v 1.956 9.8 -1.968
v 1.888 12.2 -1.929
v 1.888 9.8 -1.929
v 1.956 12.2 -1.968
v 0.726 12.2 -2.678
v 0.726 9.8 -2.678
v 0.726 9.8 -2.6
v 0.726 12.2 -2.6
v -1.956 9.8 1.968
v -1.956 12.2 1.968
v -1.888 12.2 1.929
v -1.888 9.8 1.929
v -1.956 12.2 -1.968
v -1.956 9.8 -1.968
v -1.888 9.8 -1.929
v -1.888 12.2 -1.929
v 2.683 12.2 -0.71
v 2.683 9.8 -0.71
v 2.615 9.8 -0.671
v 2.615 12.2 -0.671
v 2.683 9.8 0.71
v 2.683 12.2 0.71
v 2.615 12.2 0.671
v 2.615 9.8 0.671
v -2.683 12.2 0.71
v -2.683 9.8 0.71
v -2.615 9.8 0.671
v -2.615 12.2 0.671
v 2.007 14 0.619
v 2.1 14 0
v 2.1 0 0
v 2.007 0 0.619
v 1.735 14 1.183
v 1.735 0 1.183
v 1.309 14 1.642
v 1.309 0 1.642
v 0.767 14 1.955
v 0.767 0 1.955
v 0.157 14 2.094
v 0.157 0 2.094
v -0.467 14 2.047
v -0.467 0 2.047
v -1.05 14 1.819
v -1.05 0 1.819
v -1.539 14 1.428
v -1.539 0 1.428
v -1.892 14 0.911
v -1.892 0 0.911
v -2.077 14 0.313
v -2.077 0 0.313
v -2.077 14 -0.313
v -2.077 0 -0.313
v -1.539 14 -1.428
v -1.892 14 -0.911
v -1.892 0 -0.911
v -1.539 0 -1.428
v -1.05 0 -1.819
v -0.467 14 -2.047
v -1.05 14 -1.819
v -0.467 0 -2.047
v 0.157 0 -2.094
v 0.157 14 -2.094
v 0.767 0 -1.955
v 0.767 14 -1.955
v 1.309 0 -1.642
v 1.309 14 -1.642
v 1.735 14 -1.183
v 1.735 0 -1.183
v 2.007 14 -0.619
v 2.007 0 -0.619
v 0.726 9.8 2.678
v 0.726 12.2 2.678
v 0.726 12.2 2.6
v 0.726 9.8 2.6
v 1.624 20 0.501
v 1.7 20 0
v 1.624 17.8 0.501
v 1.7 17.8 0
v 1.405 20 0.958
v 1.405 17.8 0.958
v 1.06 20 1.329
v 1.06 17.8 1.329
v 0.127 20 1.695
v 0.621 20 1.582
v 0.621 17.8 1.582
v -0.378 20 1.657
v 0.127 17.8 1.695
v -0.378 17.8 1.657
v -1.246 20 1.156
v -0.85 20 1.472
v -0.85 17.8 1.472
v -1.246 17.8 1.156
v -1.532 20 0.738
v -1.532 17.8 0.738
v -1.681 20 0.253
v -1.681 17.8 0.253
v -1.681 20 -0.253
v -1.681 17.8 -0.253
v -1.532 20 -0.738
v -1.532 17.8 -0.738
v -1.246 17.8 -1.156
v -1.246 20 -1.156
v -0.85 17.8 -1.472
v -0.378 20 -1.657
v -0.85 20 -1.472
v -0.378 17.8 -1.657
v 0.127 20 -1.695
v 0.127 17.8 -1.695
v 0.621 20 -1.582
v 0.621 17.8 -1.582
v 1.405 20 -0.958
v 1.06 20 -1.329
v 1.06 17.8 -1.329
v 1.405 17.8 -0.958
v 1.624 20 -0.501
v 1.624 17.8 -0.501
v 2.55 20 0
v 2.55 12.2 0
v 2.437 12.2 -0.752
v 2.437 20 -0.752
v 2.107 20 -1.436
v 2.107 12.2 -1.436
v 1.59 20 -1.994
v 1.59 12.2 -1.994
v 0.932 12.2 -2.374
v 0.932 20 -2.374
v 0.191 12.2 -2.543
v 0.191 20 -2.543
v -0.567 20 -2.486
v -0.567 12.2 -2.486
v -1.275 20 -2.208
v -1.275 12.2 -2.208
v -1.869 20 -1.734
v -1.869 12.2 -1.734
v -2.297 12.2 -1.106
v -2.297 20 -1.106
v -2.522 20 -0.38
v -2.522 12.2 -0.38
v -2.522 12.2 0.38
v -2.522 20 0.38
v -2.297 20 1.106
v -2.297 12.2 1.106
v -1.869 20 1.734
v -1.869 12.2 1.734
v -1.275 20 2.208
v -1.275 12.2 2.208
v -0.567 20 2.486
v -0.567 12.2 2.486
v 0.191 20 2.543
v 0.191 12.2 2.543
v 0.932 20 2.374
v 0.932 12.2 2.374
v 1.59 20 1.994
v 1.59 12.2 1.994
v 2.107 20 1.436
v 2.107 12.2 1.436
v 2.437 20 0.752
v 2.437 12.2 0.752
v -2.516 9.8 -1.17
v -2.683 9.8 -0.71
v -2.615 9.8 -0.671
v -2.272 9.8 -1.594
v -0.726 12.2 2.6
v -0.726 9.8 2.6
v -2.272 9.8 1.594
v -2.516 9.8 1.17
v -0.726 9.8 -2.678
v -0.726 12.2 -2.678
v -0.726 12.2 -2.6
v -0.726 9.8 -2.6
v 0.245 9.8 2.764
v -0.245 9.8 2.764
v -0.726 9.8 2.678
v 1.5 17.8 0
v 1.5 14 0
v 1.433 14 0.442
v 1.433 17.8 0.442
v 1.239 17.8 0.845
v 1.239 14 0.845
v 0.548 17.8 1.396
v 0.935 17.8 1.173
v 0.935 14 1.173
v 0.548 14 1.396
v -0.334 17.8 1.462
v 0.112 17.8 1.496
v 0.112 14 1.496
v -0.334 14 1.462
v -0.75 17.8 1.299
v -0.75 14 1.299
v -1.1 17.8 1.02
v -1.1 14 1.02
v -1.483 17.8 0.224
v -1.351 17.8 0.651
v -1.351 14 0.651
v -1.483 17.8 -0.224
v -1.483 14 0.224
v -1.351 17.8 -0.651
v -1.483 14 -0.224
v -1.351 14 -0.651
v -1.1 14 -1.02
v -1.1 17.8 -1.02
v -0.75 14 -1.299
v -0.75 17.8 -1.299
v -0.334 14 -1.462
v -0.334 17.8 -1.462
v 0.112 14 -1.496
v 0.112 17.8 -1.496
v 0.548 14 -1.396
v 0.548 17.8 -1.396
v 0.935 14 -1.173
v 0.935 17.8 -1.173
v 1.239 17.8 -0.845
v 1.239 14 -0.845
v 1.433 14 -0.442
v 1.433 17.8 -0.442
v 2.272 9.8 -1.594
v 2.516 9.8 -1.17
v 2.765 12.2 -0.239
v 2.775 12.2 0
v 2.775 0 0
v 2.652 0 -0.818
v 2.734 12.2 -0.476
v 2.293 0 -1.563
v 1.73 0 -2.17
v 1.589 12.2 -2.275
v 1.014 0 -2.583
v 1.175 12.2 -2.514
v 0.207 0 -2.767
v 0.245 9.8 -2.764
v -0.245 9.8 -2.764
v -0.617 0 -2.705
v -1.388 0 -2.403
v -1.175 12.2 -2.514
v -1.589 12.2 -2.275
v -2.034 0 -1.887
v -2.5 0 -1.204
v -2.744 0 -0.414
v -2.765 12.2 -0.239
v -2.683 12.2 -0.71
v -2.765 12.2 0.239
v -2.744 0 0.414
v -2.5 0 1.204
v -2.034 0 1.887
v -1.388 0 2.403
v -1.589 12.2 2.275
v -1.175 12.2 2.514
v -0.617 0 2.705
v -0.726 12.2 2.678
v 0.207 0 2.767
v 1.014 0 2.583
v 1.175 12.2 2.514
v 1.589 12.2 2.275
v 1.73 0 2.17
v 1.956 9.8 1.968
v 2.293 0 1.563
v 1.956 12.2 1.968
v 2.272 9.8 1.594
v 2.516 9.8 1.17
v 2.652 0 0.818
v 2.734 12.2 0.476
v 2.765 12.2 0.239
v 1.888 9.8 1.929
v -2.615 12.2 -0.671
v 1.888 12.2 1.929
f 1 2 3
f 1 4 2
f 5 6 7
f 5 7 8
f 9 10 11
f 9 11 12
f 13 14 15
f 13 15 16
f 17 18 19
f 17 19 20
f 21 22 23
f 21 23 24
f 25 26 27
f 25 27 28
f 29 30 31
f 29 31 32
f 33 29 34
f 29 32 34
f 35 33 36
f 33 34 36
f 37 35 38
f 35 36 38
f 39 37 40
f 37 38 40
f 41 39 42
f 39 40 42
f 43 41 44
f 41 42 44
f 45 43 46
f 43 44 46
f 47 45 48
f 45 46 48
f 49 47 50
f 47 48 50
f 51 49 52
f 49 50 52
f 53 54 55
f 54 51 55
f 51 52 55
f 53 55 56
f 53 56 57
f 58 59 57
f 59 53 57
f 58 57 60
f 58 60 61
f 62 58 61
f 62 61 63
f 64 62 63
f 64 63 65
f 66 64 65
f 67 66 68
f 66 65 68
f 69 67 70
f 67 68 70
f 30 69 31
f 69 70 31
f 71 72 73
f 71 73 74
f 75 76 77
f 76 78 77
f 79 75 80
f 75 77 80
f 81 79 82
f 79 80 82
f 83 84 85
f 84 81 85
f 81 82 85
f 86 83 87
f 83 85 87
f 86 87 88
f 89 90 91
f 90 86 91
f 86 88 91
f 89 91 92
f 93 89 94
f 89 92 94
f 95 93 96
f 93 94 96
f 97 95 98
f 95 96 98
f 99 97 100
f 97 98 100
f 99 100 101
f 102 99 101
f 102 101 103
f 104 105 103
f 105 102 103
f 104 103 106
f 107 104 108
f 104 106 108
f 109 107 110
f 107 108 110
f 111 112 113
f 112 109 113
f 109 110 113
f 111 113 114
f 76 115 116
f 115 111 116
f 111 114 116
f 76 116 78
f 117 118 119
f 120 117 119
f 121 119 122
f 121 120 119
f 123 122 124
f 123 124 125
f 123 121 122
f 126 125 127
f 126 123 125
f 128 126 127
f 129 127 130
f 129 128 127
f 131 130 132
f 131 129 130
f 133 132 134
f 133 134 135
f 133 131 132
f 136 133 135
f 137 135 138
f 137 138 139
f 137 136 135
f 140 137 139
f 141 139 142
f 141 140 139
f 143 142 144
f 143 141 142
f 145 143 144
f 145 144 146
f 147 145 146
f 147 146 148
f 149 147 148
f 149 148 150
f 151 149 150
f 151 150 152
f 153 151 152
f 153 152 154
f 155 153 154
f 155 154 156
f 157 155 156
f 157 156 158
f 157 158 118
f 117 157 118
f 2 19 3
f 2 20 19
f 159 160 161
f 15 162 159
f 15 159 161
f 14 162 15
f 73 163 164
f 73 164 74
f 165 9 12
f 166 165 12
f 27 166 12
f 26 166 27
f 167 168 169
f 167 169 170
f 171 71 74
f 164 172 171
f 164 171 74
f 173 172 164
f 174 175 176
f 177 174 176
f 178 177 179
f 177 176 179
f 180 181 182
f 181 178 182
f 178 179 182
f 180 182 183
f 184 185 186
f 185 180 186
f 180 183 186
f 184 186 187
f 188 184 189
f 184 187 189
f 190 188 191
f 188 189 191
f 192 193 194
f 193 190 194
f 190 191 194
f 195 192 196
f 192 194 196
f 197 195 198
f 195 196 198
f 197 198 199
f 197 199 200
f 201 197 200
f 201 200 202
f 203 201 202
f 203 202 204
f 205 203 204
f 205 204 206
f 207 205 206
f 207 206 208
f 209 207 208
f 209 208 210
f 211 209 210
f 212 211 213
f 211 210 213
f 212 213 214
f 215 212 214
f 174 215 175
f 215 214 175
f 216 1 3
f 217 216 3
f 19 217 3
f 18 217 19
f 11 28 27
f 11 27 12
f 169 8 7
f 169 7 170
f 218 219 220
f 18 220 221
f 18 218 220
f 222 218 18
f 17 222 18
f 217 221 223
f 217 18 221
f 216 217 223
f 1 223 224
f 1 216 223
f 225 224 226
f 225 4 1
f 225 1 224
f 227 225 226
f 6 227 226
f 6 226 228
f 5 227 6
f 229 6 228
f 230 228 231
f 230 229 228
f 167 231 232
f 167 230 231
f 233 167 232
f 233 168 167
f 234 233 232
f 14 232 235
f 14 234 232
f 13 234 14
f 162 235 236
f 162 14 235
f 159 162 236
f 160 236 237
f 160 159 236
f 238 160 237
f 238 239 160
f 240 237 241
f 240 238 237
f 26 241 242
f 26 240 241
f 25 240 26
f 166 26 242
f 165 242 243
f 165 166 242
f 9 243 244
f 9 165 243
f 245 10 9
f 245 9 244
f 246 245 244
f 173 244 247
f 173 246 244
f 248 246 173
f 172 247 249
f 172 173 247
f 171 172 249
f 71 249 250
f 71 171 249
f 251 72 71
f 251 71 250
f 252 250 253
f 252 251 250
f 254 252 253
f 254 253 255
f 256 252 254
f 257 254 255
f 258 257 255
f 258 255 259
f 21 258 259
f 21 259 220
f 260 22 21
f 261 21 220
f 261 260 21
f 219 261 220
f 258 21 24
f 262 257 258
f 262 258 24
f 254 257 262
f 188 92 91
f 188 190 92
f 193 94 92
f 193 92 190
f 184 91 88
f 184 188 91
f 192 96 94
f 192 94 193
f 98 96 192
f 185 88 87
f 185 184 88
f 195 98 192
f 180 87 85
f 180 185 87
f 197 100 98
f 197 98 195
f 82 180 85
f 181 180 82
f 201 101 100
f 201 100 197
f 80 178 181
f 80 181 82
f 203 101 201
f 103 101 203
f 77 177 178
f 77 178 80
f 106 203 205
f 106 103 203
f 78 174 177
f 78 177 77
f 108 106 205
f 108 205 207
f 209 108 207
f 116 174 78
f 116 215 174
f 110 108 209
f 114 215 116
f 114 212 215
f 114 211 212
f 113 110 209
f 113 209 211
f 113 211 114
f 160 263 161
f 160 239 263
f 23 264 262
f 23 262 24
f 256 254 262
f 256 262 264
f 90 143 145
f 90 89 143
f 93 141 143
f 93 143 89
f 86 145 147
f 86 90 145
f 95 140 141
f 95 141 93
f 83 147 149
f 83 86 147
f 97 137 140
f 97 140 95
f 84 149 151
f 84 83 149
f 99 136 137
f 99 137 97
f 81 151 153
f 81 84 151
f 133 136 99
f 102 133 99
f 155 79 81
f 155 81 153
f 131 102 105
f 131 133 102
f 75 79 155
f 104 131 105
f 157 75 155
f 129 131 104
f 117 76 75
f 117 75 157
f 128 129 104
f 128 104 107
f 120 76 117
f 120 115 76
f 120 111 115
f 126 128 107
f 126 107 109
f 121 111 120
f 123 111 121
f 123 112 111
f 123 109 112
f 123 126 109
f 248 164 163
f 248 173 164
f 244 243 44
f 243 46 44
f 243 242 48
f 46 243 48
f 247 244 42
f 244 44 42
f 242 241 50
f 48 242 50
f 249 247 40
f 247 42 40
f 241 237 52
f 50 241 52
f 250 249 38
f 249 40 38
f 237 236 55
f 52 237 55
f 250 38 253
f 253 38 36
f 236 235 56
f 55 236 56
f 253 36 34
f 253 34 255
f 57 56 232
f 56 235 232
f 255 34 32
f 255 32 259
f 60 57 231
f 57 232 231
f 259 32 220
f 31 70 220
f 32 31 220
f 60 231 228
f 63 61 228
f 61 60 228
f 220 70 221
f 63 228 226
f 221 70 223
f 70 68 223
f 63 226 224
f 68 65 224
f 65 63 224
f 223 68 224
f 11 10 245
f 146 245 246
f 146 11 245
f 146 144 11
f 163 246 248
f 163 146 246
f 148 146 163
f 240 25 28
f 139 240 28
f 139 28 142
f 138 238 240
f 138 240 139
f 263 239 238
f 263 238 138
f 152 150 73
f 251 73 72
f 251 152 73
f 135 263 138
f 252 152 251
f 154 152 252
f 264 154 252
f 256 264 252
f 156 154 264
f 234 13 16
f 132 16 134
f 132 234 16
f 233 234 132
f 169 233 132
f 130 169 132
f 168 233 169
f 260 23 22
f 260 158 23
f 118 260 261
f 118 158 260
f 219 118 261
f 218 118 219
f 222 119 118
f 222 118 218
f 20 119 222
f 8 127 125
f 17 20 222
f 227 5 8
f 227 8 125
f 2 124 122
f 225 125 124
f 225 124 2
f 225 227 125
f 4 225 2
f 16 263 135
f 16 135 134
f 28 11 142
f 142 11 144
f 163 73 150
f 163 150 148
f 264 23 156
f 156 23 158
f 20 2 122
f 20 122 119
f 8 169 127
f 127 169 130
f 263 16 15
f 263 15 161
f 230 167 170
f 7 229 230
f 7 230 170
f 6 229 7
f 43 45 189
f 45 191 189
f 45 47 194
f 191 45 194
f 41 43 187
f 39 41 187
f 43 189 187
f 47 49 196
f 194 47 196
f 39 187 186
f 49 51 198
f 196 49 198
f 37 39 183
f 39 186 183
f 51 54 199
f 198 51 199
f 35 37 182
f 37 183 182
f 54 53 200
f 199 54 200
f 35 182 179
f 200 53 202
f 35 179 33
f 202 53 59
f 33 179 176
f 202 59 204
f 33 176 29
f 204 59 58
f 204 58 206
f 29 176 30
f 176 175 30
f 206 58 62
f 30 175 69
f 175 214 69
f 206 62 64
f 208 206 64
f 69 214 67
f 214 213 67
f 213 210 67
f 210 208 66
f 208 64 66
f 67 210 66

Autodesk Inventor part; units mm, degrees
ref_plane "YZ Plane" through (0, 0, 0) normal (1, 0, 0) x (0, 1, 0)
sketch "Sketch1" plane through (0, 0, 0) normal (0, 0, 1) x (1, 0, 0)
  line L0 (0, 0) -> (0, 20)
  line L1 (2.1, 0) -> (2.775, 0)
  line L2 (2.775, 0) -> (2.775, 12.2)
  line L3 (2.775, 12.2) -> (2.55, 12.2)
  line L4 (2.55, 12.2) -> (2.55, 20)
  line L5 (2.55, 20) -> (1.7, 20)
  line L6 (1.7, 20) -> (1.7, 17.8)
  line L7 (1.7, 17.8) -> (1.5, 17.8)
  line L8 (1.5, 17.8) -> (1.5, 14)
  line L9 (1.5, 14) -> (2.1, 14)
  line L10 (2.1, 14) -> (2.1, 0)
  dimension "d0" = 3.4
  dimension "d1" = 3
  dimension "d3" = 4.2
  dimension "d4" = 12.2
  dimension "d5" = 20
  dimension "d6" = 14
  dimension "d7" = 17.8
  dimension "d8" = 5.55
  dimension "d9" = 5.1
revolve "Revolution1" add sketch "Sketch1" angle 360 about axis through (0, 0, 0) along (0, 1, 0)
ref_plane "Work Plane1" through (0, 6.1, 2.775) normal (0, 0, 1) x (1, 0, 0)
sketch "Sketch2" plane through (0, 6.1, 2.775) normal (0, 0, 1) x (1, 0, 0)
  line L0 (-2.775, 6.1) -> (2.775, 6.1) projected
  line L1 (-2.775, -6.1) -> (2.775, -6.1) projected
  line L2 (-0.7265, 6.1) -> (0.7265, 6.1)
  line L3 (0.7265, 6.1) -> (0.7265, 3.7)
  line L4 (0.7265, 3.7) -> (-0.7265, 3.7)
  line L5 (-0.7265, 3.7) -> (-0.7265, 6.1)
  line L6 (0, -10.1) -> (0, 17.9) projected
  dimension "d12" = 9.8
  dimension "d13" = 1.453
ref_plane "Work Plane2" through (0, 0, 2.6) normal (0, 0, 1) x (1, 0, 0)
extrude "Extrusion1" cut sketch "Sketch2" against normal up to surface (0.175 mm away)
pattern_circular "Circular Pattern1" count 6 over 360 about axis through (0, 6.1, 0) along (0, -1, 0) of "Extrusion1"
properties part number "PP-06" material "ABS Plastic"
